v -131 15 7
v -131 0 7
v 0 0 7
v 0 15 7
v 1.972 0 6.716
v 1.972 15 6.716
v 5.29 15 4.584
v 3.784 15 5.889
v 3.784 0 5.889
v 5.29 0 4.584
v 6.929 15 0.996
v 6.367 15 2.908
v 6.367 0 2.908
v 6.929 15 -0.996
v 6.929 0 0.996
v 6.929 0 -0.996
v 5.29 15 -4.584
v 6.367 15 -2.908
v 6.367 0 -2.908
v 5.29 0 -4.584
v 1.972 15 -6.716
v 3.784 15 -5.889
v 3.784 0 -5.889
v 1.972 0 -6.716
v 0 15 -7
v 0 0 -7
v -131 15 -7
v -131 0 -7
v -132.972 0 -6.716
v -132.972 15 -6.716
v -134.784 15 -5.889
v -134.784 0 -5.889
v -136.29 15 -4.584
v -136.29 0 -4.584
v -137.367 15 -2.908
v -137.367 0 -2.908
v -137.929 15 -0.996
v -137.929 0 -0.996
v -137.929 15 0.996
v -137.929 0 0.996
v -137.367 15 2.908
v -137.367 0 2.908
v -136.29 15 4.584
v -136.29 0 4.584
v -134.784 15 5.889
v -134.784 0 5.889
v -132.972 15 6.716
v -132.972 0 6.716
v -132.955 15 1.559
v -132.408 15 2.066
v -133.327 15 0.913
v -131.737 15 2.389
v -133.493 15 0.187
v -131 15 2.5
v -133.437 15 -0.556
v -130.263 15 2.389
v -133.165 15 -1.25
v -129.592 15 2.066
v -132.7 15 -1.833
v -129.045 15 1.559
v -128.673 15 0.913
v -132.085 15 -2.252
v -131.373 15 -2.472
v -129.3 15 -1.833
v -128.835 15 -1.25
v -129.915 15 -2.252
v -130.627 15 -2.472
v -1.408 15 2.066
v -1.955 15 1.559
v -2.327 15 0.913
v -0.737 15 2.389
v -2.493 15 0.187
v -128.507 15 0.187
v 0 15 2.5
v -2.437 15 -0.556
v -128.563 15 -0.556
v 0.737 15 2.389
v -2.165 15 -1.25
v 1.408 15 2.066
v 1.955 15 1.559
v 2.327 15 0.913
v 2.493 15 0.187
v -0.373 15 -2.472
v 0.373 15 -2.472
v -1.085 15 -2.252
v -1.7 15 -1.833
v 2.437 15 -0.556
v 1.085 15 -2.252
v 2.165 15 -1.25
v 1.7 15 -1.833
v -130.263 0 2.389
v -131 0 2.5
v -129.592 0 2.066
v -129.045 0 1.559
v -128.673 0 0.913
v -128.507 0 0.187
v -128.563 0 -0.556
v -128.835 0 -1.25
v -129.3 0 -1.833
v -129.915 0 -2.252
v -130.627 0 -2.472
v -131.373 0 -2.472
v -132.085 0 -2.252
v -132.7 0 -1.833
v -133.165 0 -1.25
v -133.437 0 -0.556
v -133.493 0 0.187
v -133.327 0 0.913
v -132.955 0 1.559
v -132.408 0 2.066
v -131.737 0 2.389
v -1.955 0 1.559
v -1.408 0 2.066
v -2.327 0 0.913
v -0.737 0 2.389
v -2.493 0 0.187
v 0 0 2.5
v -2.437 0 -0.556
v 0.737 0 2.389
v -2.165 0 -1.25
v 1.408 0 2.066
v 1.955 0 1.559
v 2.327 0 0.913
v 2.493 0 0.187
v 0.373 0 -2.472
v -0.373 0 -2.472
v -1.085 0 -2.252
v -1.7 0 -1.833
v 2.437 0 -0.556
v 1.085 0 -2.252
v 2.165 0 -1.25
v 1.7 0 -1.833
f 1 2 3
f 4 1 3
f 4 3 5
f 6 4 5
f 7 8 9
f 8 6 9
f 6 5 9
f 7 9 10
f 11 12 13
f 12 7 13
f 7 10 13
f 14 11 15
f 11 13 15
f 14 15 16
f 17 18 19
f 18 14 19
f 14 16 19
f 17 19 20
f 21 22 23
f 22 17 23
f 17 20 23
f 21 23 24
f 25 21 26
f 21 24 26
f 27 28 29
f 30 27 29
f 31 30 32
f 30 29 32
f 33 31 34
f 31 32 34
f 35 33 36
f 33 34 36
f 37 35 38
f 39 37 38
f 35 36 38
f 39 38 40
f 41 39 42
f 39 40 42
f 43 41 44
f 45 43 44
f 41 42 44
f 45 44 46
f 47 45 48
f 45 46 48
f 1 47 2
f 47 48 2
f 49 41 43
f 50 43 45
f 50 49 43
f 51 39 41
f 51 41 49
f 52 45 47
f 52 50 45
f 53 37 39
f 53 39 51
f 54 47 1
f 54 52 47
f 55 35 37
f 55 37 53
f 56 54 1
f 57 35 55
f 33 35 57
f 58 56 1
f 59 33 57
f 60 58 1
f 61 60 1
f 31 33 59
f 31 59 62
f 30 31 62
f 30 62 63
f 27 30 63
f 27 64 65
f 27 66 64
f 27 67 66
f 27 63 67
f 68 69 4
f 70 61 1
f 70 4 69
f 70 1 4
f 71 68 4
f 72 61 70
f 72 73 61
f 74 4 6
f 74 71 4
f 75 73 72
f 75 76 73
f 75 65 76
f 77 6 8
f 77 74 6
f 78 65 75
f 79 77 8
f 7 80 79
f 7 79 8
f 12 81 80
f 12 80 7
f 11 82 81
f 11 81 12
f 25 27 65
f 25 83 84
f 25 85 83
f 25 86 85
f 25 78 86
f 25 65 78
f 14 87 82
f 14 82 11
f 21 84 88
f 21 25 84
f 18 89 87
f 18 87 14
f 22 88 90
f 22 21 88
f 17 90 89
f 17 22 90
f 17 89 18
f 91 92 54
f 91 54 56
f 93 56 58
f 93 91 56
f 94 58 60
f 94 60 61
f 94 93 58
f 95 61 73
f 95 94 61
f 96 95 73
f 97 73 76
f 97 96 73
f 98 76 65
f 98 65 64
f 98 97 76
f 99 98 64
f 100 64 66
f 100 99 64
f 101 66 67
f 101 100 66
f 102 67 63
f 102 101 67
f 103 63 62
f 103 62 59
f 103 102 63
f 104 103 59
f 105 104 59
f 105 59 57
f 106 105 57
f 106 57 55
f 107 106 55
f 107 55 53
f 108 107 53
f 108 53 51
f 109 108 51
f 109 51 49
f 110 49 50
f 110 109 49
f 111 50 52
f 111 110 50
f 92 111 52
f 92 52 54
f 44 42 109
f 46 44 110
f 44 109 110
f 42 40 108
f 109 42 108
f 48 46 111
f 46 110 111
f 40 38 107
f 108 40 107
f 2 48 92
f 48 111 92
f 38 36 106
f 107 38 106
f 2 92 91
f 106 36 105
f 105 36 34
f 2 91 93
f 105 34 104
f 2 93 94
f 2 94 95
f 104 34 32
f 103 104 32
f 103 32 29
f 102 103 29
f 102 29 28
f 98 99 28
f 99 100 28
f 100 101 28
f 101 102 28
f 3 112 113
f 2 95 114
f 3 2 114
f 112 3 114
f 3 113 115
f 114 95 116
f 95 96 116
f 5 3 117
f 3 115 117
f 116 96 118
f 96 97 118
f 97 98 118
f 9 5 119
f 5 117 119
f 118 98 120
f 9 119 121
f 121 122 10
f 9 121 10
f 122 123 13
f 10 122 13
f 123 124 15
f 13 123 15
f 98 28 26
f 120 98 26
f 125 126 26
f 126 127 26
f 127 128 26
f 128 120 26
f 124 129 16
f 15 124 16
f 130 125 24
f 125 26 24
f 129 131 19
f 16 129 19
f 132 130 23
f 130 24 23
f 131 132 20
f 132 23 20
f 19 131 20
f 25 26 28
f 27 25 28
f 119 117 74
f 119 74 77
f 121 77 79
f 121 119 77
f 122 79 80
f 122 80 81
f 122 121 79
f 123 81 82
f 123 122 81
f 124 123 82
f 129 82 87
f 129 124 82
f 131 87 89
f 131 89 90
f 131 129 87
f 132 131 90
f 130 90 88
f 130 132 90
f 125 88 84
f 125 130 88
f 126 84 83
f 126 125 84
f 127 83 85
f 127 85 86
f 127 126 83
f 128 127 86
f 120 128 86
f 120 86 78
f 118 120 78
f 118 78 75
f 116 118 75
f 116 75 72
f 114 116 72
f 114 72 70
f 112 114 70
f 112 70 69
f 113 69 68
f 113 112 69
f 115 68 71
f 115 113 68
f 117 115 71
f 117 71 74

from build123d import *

# Parameters (mm, degrees)
SKETCH1_R           = 7
SKETCH1_R_2         = 2.5
BOSS_EXTRUDE1_DEPTH = 15


with BuildPart() as part:
    # Sketch1 → Boss-Extrude1 (new body)
    # profile 1 of 3: a face of its own
    with BuildSketch(Plane(origin=(0, 0, 0), x_dir=(1, 0, 0), z_dir=(0, 1, 0))):
        with BuildLine():
            Line((0, 7), (-131, 7))
            ThreePointArc((-131, 7), (-126.050252532, 4.949747468), (-124, 0))
            ThreePointArc((-124, 0), (-126.050252532, -4.949747468), (-131, -7))
            Line((-131, -7), (-55.118468675, -7))
            Line((-55.118468675, -7), (0, -7))
            ThreePointArc((0, -7), (-7, 0), (0, 7))
        make_face()
    # profile 2 of 3: a face of its own
    with BuildSketch(Plane(origin=(0, 0, 0), x_dir=(1, 0, 0), z_dir=(0, 1, 0))):
        with Locations((-131, 0)):
            Circle(SKETCH1_R)
        with Locations(Location((-131, 0, 0), (0, 0, 270))):
            Circle(SKETCH1_R_2, mode=Mode.SUBTRACT)
    # profile 3 of 3: a face of its own
    with BuildSketch(Plane(origin=(0, 0, 0), x_dir=(1, 0, 0), z_dir=(0, 1, 0))):
        Circle(SKETCH1_R)
        with Locations(Location((0, 0, 0), (0, 0, 270))):
            Circle(SKETCH1_R_2, mode=Mode.SUBTRACT)
    extrude(amount=BOSS_EXTRUDE1_DEPTH)


solid = part.part
